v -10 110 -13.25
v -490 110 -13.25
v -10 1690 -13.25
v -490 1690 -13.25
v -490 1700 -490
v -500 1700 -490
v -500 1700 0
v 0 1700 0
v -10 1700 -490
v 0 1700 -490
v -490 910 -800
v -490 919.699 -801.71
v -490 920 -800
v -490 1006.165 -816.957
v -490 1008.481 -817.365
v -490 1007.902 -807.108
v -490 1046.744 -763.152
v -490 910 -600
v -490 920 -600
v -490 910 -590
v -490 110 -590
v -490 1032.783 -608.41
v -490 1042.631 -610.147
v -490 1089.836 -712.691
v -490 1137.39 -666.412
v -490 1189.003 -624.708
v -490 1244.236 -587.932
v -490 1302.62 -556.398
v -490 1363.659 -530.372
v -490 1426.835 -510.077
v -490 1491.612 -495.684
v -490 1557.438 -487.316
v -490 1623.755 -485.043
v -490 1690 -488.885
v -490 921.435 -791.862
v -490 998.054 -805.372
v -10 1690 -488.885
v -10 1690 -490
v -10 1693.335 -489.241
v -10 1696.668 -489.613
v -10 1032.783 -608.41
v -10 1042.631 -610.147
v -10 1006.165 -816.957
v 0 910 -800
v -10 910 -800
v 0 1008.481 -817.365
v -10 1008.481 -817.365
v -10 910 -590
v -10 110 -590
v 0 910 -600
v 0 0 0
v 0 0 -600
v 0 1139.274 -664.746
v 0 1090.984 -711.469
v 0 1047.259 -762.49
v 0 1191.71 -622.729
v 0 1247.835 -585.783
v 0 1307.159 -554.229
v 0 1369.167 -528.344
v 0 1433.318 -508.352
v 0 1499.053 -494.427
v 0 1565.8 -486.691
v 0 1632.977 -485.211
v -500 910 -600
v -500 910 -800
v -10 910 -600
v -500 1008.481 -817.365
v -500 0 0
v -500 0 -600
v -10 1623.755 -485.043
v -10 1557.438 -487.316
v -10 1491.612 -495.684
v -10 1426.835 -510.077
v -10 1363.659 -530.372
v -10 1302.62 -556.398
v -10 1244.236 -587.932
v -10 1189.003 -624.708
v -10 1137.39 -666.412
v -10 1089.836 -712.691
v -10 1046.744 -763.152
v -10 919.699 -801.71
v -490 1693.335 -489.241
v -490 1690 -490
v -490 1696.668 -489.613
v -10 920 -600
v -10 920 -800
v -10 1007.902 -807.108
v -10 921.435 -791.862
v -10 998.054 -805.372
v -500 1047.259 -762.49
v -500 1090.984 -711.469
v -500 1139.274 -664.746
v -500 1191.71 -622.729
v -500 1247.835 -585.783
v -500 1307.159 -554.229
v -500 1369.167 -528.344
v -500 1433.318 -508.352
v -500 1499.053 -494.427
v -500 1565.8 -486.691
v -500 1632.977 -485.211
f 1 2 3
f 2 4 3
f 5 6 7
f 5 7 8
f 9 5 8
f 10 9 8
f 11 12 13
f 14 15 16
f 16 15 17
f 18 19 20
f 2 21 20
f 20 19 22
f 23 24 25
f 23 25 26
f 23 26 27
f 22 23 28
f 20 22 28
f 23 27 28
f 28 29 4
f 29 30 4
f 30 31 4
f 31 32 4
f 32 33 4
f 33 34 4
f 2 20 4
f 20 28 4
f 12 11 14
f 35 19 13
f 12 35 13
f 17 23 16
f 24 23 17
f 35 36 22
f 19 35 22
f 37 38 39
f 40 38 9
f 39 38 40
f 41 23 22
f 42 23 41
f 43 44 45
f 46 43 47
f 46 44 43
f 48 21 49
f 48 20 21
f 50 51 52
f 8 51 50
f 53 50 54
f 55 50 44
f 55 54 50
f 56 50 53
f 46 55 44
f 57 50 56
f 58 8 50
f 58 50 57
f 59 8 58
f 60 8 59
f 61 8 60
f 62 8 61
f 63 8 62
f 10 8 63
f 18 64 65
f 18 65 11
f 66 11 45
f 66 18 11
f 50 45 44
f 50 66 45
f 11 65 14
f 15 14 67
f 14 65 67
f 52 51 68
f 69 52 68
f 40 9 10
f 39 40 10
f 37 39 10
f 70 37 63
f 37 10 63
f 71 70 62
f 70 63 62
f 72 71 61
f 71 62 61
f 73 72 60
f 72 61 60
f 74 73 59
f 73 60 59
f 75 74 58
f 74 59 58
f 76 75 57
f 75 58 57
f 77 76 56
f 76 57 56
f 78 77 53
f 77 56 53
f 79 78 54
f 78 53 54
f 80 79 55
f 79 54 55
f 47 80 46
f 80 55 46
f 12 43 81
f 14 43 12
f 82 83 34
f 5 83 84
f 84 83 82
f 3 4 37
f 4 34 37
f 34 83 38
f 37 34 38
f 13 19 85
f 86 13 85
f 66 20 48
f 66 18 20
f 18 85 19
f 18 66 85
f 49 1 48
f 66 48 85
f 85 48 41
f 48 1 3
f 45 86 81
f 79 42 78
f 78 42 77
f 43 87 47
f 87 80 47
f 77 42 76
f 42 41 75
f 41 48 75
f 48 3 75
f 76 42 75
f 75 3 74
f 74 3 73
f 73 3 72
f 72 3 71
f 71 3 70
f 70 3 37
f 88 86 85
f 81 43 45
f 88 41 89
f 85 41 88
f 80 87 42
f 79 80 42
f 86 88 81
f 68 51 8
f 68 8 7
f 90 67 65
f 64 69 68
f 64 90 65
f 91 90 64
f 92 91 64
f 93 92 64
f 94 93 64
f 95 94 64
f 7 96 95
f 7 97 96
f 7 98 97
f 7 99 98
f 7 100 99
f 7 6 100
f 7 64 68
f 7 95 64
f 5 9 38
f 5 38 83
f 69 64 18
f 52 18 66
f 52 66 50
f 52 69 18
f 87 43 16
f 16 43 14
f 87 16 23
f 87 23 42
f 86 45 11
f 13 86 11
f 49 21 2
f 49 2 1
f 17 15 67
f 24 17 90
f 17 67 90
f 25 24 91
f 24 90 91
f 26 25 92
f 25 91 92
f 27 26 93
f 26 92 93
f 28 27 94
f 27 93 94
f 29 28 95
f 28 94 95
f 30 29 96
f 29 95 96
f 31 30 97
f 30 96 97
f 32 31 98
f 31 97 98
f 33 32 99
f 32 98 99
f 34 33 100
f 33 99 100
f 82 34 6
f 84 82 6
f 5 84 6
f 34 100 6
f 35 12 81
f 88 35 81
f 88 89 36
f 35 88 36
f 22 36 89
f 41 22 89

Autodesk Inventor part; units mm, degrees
ref_plane "YZ Plane" through (0, 0, 0) normal (1, 0, 0) x (0, 1, 0)
ref_plane "XZ Plane" through (0, 0, 0) normal (0, 1, 0) x (-1, 0, 0)
ref_plane "XY Plane" through (0, 0, 0) normal (0, 0, 1) x (1, 0, 0)
sketch "Esquisse1" plane through (0, 0, 0) normal (0, 1, 0) x (-1, 0, 0)
  line L0 (0, 0) -> (500, 0)
  line L1 (500, 0) -> (500, -600)
  line L2 (500, -600) -> (0, -600)
  line L3 (0, -600) -> (0, 0)
  dimension "d0" = 500
  dimension "d1" = 600
extrude "Extrusion1" add sketch "Esquisse1" along normal blind 1700
sketch "Esquisse3" plane through (0, 1700, 0) normal (0, 1, 0) x (1, 0, 0)
  line L0 (-500, 600) -> (-500, 0) projected
  line L1 (0, 600) -> (-500, 600) projected
  line L2 (-500, 13.2496) -> (0, 13.2496)
  line L3 (0, 13.2496) -> (0, 600)
  line L4 (0, 600) -> (-500, 600)
  line L5 (-500, 600) -> (-500, 13.2496)
  point P0 (0, 0)
extrude "Extrusion2" cut sketch "Esquisse3" against normal blind 790
sketch "Esquisse4" plane through (0, 910, 0) normal (0, 1, 0) x (1, 0, 0)
  line L0 (0, 13.2496) -> (-500, 13.2496) projected
  line L1 (0, 13.2496) -> (-10, 13.2496)
  line L2 (0, 600) -> (-500, 600) projected
  line L3 (-500, 600) -> (-490, 600)
  line L4 (-490, 600) -> (-490, 590)
  line L5 (-490, 590) -> (-10, 590)
  line L6 (-10, 590) -> (-10, 13.2496)
  line L7 (-10, 13.2496) -> (-490, 13.2496)
  line L8 (-490, 13.2496) -> (-490, 590)
  point P0 (0, 0)
  dimension "d7" = 10
  dimension "d8" = 10
  dimension "d9" = 10
extrude "Extrusion3" cut sketch "Esquisse4" against normal blind 800
sketch "Esquisse5" plane through (0, 0, 0) normal (1, 0, 0) x (0, 0, -1)
  line L0 (600, 0) -> (600, 910) projected
  line L1 (600, 910) -> (800, 910)
  line L2 (800, 910) -> (817.3648, 1008.4808)
  line L3 (0, 0) -> (0, 1700) projected
  line L4 (0, 1700) -> (490, 1700)
  arc A0 (490, 1700) -> (817.3648, 1008.4808) centre (1204.9924, 1615.2302) ccw
  line L5 (13.2496, 1700) -> (13.2496, 910) projected
  line L6 (13.2496, 1700) -> (13.2496, 910)
  line L7 (13.2496, 910) -> (590, 910) projected
  line L8 (800, 910) -> (13.2496, 910)
  dimension "d12" = 200
  dimension "d13" = 100
  dimension "d14" = 100
  dimension "d15" = 490
  dimension "d16" = 720
extrude "Extrusion4" add sketch "Esquisse5" against normal blind 10
sketch "Esquisse6" plane through (-500, 0, -600) normal (-1, 0, 0) x (0, 0, 1)
  line L0 (0, 0) -> (0, 910) projected
  line L1 (0, 910) -> (-200, 910) projected
  line L2 (0, 910) -> (-200, 910)
  line L3 (-200, 910) -> (-217.3648, 1008.4808)
  line L4 (586.7504, 910) -> (586.7504, 110) projected
  line L5 (0, 910) -> (586.7504, 910)
  line L6 (586.7504, 1700) -> (110, 1700) projected
  line L7 (586.7504, 910) -> (586.7504, 1700)
  line L8 (586.7504, 1700) -> (110, 1700)
  arc A0 (-217.3648, 1008.4808) -> (110, 1700) centre (-604.9924, 1615.2302) ccw
  point P0 (600, 0)
  dimension "d19" = 100
  dimension "d20" = 100
sketch "Esquisse7" plane through (-500, 0, -600) normal (-1, 0, 0) x (0, 0, 1)
  line L0 (586.7504, 1700) -> (110, 1700) projected
  line L1 (110, 1700) -> (586.7504, 1700)
  line L2 (0, 0) -> (0, 910) projected
  line L3 (586.7504, 910) -> (10, 910) projected
  line L4 (0, 910) -> (586.7504, 910)
  line L5 (586.7504, 910) -> (586.7504, 1700)
  line L6 (0, 910) -> (-200, 910) projected
  line L7 (0, 910) -> (-200, 910)
  line L8 (-217.3648, 1008.4808) -> (-200, 910) projected
  line L9 (-200, 910) -> (-217.3648, 1008.4808)
  point P0 (600, 0)
extrude "Extrusion5" add sketch "Esquisse6" against normal blind 10
ref_plane "Plan de construction1" through (0, 910, -800) normal (0, -1, 0) x (1, 0, 0)
sketch "Esquisse8" plane through (0, 910, -800) normal (0, -1, 0) x (1, 0, 0)
  line L0 (-10, 0) -> (-10, 200) projected
  line L1 (0, 200) -> (-500, 200) projected
  line L2 (-10, 0) -> (-490, 0)
  line L3 (-490, 0) -> (-490, 200)
  line L4 (-490, 200) -> (-10, 200)
  line L5 (-10, 200) -> (-10, 0)
  point P0 (0, 800)
  dimension "d23" = 480
extrude "Extrusion6" add sketch "Esquisse8" against normal blind 10
sketch "Esquisse9" plane through (-490, 1008.4808, -817.3648) normal (0, -0.1736, -0.9848) x (-1, 0, 0)
  line L0 (-480, 541.3803) -> (-480, -1024.464) projected
  line L1 (0, -90.1519) -> (0, -100) projected
  line L2 (-480, -2.3513) -> (0, -2.3513)
  line L3 (0, -2.3513) -> (0, -90.1519)
  line L4 (0, -90.1519) -> (-480, -90.1519)
  line L5 (-480, -90.1519) -> (-480, -2.3513)
  point P0 (-490, -1135.0936)
extrude "Extrusion7" add sketch "Esquisse9" against normal blind 10
sketch "Esquisse10" plane through (0, 1700, 0) normal (0, 1, 0) x (1, 0, 0)
  point P0 (0, 0)
sketch "Esquisse11" plane through (0, 1700, 0) normal (0, 1, 0) x (1, 0, 0)
  line L0 (-500, 490) -> (-490, 490) projected
  line L1 (-490, 490) -> (-490, 10)
  line L2 (-490, 13.2496) -> (-490, 590) projected
  line L3 (-10, 590) -> (-10, 13.2496) projected
  line L4 (-10, 13.2496) -> (-490, 13.2496) projected
  line L5 (-10, 490) -> (-490, 490)
  line L6 (-490, 490) -> (-490, 13.2496)
  line L7 (-490, 13.2496) -> (-10, 13.2496)
  line L8 (-10, 13.2496) -> (-10, 490)
  point P0 (0, 0)
  dimension "d28" = 480
extrude "Extrusion8" add sketch "Esquisse11" against normal blind 10
sketch "Esquisse13" plane through (-490, 1006.1652, -816.9565) normal (0, 0.9848, -0.1736) x (1, 0, 0)
  line L0 (480, -10) -> (0, -10) projected
  line L1 (480, -10) -> (0, -10)
  line L2 (0, -10) -> (0, -210)
  line L3 (0, -210) -> (480, -210)
  line L4 (480, -210) -> (480, -10)
  point P0 (490, -629.8264)
  dimension "d33" = 480
  dimension "d34" = 200
extrude "Extrusion9" add sketch "Esquisse13" against normal blind 10
equation "\"RayonPli\" = Epaisseur"
equation "\"LargeurGrugeage\" = Epaisseur"
equation "\"ProfondeurGrugeage\" = 0.5 * Epaisseur"
equation "\"TailleGrugeage\" = 4 * Epaisseur"
equation "\"RestesMinimum\" = 2 * Epaisseur"
equation "\"Rayondetransition\" = RayonPli"
equation "\"TailleRayonJacobi\" = RayonPli"
equation "\"TailleJeu\" = Epaisseur"
equation "\"Epaisseur\" = 0.5"
